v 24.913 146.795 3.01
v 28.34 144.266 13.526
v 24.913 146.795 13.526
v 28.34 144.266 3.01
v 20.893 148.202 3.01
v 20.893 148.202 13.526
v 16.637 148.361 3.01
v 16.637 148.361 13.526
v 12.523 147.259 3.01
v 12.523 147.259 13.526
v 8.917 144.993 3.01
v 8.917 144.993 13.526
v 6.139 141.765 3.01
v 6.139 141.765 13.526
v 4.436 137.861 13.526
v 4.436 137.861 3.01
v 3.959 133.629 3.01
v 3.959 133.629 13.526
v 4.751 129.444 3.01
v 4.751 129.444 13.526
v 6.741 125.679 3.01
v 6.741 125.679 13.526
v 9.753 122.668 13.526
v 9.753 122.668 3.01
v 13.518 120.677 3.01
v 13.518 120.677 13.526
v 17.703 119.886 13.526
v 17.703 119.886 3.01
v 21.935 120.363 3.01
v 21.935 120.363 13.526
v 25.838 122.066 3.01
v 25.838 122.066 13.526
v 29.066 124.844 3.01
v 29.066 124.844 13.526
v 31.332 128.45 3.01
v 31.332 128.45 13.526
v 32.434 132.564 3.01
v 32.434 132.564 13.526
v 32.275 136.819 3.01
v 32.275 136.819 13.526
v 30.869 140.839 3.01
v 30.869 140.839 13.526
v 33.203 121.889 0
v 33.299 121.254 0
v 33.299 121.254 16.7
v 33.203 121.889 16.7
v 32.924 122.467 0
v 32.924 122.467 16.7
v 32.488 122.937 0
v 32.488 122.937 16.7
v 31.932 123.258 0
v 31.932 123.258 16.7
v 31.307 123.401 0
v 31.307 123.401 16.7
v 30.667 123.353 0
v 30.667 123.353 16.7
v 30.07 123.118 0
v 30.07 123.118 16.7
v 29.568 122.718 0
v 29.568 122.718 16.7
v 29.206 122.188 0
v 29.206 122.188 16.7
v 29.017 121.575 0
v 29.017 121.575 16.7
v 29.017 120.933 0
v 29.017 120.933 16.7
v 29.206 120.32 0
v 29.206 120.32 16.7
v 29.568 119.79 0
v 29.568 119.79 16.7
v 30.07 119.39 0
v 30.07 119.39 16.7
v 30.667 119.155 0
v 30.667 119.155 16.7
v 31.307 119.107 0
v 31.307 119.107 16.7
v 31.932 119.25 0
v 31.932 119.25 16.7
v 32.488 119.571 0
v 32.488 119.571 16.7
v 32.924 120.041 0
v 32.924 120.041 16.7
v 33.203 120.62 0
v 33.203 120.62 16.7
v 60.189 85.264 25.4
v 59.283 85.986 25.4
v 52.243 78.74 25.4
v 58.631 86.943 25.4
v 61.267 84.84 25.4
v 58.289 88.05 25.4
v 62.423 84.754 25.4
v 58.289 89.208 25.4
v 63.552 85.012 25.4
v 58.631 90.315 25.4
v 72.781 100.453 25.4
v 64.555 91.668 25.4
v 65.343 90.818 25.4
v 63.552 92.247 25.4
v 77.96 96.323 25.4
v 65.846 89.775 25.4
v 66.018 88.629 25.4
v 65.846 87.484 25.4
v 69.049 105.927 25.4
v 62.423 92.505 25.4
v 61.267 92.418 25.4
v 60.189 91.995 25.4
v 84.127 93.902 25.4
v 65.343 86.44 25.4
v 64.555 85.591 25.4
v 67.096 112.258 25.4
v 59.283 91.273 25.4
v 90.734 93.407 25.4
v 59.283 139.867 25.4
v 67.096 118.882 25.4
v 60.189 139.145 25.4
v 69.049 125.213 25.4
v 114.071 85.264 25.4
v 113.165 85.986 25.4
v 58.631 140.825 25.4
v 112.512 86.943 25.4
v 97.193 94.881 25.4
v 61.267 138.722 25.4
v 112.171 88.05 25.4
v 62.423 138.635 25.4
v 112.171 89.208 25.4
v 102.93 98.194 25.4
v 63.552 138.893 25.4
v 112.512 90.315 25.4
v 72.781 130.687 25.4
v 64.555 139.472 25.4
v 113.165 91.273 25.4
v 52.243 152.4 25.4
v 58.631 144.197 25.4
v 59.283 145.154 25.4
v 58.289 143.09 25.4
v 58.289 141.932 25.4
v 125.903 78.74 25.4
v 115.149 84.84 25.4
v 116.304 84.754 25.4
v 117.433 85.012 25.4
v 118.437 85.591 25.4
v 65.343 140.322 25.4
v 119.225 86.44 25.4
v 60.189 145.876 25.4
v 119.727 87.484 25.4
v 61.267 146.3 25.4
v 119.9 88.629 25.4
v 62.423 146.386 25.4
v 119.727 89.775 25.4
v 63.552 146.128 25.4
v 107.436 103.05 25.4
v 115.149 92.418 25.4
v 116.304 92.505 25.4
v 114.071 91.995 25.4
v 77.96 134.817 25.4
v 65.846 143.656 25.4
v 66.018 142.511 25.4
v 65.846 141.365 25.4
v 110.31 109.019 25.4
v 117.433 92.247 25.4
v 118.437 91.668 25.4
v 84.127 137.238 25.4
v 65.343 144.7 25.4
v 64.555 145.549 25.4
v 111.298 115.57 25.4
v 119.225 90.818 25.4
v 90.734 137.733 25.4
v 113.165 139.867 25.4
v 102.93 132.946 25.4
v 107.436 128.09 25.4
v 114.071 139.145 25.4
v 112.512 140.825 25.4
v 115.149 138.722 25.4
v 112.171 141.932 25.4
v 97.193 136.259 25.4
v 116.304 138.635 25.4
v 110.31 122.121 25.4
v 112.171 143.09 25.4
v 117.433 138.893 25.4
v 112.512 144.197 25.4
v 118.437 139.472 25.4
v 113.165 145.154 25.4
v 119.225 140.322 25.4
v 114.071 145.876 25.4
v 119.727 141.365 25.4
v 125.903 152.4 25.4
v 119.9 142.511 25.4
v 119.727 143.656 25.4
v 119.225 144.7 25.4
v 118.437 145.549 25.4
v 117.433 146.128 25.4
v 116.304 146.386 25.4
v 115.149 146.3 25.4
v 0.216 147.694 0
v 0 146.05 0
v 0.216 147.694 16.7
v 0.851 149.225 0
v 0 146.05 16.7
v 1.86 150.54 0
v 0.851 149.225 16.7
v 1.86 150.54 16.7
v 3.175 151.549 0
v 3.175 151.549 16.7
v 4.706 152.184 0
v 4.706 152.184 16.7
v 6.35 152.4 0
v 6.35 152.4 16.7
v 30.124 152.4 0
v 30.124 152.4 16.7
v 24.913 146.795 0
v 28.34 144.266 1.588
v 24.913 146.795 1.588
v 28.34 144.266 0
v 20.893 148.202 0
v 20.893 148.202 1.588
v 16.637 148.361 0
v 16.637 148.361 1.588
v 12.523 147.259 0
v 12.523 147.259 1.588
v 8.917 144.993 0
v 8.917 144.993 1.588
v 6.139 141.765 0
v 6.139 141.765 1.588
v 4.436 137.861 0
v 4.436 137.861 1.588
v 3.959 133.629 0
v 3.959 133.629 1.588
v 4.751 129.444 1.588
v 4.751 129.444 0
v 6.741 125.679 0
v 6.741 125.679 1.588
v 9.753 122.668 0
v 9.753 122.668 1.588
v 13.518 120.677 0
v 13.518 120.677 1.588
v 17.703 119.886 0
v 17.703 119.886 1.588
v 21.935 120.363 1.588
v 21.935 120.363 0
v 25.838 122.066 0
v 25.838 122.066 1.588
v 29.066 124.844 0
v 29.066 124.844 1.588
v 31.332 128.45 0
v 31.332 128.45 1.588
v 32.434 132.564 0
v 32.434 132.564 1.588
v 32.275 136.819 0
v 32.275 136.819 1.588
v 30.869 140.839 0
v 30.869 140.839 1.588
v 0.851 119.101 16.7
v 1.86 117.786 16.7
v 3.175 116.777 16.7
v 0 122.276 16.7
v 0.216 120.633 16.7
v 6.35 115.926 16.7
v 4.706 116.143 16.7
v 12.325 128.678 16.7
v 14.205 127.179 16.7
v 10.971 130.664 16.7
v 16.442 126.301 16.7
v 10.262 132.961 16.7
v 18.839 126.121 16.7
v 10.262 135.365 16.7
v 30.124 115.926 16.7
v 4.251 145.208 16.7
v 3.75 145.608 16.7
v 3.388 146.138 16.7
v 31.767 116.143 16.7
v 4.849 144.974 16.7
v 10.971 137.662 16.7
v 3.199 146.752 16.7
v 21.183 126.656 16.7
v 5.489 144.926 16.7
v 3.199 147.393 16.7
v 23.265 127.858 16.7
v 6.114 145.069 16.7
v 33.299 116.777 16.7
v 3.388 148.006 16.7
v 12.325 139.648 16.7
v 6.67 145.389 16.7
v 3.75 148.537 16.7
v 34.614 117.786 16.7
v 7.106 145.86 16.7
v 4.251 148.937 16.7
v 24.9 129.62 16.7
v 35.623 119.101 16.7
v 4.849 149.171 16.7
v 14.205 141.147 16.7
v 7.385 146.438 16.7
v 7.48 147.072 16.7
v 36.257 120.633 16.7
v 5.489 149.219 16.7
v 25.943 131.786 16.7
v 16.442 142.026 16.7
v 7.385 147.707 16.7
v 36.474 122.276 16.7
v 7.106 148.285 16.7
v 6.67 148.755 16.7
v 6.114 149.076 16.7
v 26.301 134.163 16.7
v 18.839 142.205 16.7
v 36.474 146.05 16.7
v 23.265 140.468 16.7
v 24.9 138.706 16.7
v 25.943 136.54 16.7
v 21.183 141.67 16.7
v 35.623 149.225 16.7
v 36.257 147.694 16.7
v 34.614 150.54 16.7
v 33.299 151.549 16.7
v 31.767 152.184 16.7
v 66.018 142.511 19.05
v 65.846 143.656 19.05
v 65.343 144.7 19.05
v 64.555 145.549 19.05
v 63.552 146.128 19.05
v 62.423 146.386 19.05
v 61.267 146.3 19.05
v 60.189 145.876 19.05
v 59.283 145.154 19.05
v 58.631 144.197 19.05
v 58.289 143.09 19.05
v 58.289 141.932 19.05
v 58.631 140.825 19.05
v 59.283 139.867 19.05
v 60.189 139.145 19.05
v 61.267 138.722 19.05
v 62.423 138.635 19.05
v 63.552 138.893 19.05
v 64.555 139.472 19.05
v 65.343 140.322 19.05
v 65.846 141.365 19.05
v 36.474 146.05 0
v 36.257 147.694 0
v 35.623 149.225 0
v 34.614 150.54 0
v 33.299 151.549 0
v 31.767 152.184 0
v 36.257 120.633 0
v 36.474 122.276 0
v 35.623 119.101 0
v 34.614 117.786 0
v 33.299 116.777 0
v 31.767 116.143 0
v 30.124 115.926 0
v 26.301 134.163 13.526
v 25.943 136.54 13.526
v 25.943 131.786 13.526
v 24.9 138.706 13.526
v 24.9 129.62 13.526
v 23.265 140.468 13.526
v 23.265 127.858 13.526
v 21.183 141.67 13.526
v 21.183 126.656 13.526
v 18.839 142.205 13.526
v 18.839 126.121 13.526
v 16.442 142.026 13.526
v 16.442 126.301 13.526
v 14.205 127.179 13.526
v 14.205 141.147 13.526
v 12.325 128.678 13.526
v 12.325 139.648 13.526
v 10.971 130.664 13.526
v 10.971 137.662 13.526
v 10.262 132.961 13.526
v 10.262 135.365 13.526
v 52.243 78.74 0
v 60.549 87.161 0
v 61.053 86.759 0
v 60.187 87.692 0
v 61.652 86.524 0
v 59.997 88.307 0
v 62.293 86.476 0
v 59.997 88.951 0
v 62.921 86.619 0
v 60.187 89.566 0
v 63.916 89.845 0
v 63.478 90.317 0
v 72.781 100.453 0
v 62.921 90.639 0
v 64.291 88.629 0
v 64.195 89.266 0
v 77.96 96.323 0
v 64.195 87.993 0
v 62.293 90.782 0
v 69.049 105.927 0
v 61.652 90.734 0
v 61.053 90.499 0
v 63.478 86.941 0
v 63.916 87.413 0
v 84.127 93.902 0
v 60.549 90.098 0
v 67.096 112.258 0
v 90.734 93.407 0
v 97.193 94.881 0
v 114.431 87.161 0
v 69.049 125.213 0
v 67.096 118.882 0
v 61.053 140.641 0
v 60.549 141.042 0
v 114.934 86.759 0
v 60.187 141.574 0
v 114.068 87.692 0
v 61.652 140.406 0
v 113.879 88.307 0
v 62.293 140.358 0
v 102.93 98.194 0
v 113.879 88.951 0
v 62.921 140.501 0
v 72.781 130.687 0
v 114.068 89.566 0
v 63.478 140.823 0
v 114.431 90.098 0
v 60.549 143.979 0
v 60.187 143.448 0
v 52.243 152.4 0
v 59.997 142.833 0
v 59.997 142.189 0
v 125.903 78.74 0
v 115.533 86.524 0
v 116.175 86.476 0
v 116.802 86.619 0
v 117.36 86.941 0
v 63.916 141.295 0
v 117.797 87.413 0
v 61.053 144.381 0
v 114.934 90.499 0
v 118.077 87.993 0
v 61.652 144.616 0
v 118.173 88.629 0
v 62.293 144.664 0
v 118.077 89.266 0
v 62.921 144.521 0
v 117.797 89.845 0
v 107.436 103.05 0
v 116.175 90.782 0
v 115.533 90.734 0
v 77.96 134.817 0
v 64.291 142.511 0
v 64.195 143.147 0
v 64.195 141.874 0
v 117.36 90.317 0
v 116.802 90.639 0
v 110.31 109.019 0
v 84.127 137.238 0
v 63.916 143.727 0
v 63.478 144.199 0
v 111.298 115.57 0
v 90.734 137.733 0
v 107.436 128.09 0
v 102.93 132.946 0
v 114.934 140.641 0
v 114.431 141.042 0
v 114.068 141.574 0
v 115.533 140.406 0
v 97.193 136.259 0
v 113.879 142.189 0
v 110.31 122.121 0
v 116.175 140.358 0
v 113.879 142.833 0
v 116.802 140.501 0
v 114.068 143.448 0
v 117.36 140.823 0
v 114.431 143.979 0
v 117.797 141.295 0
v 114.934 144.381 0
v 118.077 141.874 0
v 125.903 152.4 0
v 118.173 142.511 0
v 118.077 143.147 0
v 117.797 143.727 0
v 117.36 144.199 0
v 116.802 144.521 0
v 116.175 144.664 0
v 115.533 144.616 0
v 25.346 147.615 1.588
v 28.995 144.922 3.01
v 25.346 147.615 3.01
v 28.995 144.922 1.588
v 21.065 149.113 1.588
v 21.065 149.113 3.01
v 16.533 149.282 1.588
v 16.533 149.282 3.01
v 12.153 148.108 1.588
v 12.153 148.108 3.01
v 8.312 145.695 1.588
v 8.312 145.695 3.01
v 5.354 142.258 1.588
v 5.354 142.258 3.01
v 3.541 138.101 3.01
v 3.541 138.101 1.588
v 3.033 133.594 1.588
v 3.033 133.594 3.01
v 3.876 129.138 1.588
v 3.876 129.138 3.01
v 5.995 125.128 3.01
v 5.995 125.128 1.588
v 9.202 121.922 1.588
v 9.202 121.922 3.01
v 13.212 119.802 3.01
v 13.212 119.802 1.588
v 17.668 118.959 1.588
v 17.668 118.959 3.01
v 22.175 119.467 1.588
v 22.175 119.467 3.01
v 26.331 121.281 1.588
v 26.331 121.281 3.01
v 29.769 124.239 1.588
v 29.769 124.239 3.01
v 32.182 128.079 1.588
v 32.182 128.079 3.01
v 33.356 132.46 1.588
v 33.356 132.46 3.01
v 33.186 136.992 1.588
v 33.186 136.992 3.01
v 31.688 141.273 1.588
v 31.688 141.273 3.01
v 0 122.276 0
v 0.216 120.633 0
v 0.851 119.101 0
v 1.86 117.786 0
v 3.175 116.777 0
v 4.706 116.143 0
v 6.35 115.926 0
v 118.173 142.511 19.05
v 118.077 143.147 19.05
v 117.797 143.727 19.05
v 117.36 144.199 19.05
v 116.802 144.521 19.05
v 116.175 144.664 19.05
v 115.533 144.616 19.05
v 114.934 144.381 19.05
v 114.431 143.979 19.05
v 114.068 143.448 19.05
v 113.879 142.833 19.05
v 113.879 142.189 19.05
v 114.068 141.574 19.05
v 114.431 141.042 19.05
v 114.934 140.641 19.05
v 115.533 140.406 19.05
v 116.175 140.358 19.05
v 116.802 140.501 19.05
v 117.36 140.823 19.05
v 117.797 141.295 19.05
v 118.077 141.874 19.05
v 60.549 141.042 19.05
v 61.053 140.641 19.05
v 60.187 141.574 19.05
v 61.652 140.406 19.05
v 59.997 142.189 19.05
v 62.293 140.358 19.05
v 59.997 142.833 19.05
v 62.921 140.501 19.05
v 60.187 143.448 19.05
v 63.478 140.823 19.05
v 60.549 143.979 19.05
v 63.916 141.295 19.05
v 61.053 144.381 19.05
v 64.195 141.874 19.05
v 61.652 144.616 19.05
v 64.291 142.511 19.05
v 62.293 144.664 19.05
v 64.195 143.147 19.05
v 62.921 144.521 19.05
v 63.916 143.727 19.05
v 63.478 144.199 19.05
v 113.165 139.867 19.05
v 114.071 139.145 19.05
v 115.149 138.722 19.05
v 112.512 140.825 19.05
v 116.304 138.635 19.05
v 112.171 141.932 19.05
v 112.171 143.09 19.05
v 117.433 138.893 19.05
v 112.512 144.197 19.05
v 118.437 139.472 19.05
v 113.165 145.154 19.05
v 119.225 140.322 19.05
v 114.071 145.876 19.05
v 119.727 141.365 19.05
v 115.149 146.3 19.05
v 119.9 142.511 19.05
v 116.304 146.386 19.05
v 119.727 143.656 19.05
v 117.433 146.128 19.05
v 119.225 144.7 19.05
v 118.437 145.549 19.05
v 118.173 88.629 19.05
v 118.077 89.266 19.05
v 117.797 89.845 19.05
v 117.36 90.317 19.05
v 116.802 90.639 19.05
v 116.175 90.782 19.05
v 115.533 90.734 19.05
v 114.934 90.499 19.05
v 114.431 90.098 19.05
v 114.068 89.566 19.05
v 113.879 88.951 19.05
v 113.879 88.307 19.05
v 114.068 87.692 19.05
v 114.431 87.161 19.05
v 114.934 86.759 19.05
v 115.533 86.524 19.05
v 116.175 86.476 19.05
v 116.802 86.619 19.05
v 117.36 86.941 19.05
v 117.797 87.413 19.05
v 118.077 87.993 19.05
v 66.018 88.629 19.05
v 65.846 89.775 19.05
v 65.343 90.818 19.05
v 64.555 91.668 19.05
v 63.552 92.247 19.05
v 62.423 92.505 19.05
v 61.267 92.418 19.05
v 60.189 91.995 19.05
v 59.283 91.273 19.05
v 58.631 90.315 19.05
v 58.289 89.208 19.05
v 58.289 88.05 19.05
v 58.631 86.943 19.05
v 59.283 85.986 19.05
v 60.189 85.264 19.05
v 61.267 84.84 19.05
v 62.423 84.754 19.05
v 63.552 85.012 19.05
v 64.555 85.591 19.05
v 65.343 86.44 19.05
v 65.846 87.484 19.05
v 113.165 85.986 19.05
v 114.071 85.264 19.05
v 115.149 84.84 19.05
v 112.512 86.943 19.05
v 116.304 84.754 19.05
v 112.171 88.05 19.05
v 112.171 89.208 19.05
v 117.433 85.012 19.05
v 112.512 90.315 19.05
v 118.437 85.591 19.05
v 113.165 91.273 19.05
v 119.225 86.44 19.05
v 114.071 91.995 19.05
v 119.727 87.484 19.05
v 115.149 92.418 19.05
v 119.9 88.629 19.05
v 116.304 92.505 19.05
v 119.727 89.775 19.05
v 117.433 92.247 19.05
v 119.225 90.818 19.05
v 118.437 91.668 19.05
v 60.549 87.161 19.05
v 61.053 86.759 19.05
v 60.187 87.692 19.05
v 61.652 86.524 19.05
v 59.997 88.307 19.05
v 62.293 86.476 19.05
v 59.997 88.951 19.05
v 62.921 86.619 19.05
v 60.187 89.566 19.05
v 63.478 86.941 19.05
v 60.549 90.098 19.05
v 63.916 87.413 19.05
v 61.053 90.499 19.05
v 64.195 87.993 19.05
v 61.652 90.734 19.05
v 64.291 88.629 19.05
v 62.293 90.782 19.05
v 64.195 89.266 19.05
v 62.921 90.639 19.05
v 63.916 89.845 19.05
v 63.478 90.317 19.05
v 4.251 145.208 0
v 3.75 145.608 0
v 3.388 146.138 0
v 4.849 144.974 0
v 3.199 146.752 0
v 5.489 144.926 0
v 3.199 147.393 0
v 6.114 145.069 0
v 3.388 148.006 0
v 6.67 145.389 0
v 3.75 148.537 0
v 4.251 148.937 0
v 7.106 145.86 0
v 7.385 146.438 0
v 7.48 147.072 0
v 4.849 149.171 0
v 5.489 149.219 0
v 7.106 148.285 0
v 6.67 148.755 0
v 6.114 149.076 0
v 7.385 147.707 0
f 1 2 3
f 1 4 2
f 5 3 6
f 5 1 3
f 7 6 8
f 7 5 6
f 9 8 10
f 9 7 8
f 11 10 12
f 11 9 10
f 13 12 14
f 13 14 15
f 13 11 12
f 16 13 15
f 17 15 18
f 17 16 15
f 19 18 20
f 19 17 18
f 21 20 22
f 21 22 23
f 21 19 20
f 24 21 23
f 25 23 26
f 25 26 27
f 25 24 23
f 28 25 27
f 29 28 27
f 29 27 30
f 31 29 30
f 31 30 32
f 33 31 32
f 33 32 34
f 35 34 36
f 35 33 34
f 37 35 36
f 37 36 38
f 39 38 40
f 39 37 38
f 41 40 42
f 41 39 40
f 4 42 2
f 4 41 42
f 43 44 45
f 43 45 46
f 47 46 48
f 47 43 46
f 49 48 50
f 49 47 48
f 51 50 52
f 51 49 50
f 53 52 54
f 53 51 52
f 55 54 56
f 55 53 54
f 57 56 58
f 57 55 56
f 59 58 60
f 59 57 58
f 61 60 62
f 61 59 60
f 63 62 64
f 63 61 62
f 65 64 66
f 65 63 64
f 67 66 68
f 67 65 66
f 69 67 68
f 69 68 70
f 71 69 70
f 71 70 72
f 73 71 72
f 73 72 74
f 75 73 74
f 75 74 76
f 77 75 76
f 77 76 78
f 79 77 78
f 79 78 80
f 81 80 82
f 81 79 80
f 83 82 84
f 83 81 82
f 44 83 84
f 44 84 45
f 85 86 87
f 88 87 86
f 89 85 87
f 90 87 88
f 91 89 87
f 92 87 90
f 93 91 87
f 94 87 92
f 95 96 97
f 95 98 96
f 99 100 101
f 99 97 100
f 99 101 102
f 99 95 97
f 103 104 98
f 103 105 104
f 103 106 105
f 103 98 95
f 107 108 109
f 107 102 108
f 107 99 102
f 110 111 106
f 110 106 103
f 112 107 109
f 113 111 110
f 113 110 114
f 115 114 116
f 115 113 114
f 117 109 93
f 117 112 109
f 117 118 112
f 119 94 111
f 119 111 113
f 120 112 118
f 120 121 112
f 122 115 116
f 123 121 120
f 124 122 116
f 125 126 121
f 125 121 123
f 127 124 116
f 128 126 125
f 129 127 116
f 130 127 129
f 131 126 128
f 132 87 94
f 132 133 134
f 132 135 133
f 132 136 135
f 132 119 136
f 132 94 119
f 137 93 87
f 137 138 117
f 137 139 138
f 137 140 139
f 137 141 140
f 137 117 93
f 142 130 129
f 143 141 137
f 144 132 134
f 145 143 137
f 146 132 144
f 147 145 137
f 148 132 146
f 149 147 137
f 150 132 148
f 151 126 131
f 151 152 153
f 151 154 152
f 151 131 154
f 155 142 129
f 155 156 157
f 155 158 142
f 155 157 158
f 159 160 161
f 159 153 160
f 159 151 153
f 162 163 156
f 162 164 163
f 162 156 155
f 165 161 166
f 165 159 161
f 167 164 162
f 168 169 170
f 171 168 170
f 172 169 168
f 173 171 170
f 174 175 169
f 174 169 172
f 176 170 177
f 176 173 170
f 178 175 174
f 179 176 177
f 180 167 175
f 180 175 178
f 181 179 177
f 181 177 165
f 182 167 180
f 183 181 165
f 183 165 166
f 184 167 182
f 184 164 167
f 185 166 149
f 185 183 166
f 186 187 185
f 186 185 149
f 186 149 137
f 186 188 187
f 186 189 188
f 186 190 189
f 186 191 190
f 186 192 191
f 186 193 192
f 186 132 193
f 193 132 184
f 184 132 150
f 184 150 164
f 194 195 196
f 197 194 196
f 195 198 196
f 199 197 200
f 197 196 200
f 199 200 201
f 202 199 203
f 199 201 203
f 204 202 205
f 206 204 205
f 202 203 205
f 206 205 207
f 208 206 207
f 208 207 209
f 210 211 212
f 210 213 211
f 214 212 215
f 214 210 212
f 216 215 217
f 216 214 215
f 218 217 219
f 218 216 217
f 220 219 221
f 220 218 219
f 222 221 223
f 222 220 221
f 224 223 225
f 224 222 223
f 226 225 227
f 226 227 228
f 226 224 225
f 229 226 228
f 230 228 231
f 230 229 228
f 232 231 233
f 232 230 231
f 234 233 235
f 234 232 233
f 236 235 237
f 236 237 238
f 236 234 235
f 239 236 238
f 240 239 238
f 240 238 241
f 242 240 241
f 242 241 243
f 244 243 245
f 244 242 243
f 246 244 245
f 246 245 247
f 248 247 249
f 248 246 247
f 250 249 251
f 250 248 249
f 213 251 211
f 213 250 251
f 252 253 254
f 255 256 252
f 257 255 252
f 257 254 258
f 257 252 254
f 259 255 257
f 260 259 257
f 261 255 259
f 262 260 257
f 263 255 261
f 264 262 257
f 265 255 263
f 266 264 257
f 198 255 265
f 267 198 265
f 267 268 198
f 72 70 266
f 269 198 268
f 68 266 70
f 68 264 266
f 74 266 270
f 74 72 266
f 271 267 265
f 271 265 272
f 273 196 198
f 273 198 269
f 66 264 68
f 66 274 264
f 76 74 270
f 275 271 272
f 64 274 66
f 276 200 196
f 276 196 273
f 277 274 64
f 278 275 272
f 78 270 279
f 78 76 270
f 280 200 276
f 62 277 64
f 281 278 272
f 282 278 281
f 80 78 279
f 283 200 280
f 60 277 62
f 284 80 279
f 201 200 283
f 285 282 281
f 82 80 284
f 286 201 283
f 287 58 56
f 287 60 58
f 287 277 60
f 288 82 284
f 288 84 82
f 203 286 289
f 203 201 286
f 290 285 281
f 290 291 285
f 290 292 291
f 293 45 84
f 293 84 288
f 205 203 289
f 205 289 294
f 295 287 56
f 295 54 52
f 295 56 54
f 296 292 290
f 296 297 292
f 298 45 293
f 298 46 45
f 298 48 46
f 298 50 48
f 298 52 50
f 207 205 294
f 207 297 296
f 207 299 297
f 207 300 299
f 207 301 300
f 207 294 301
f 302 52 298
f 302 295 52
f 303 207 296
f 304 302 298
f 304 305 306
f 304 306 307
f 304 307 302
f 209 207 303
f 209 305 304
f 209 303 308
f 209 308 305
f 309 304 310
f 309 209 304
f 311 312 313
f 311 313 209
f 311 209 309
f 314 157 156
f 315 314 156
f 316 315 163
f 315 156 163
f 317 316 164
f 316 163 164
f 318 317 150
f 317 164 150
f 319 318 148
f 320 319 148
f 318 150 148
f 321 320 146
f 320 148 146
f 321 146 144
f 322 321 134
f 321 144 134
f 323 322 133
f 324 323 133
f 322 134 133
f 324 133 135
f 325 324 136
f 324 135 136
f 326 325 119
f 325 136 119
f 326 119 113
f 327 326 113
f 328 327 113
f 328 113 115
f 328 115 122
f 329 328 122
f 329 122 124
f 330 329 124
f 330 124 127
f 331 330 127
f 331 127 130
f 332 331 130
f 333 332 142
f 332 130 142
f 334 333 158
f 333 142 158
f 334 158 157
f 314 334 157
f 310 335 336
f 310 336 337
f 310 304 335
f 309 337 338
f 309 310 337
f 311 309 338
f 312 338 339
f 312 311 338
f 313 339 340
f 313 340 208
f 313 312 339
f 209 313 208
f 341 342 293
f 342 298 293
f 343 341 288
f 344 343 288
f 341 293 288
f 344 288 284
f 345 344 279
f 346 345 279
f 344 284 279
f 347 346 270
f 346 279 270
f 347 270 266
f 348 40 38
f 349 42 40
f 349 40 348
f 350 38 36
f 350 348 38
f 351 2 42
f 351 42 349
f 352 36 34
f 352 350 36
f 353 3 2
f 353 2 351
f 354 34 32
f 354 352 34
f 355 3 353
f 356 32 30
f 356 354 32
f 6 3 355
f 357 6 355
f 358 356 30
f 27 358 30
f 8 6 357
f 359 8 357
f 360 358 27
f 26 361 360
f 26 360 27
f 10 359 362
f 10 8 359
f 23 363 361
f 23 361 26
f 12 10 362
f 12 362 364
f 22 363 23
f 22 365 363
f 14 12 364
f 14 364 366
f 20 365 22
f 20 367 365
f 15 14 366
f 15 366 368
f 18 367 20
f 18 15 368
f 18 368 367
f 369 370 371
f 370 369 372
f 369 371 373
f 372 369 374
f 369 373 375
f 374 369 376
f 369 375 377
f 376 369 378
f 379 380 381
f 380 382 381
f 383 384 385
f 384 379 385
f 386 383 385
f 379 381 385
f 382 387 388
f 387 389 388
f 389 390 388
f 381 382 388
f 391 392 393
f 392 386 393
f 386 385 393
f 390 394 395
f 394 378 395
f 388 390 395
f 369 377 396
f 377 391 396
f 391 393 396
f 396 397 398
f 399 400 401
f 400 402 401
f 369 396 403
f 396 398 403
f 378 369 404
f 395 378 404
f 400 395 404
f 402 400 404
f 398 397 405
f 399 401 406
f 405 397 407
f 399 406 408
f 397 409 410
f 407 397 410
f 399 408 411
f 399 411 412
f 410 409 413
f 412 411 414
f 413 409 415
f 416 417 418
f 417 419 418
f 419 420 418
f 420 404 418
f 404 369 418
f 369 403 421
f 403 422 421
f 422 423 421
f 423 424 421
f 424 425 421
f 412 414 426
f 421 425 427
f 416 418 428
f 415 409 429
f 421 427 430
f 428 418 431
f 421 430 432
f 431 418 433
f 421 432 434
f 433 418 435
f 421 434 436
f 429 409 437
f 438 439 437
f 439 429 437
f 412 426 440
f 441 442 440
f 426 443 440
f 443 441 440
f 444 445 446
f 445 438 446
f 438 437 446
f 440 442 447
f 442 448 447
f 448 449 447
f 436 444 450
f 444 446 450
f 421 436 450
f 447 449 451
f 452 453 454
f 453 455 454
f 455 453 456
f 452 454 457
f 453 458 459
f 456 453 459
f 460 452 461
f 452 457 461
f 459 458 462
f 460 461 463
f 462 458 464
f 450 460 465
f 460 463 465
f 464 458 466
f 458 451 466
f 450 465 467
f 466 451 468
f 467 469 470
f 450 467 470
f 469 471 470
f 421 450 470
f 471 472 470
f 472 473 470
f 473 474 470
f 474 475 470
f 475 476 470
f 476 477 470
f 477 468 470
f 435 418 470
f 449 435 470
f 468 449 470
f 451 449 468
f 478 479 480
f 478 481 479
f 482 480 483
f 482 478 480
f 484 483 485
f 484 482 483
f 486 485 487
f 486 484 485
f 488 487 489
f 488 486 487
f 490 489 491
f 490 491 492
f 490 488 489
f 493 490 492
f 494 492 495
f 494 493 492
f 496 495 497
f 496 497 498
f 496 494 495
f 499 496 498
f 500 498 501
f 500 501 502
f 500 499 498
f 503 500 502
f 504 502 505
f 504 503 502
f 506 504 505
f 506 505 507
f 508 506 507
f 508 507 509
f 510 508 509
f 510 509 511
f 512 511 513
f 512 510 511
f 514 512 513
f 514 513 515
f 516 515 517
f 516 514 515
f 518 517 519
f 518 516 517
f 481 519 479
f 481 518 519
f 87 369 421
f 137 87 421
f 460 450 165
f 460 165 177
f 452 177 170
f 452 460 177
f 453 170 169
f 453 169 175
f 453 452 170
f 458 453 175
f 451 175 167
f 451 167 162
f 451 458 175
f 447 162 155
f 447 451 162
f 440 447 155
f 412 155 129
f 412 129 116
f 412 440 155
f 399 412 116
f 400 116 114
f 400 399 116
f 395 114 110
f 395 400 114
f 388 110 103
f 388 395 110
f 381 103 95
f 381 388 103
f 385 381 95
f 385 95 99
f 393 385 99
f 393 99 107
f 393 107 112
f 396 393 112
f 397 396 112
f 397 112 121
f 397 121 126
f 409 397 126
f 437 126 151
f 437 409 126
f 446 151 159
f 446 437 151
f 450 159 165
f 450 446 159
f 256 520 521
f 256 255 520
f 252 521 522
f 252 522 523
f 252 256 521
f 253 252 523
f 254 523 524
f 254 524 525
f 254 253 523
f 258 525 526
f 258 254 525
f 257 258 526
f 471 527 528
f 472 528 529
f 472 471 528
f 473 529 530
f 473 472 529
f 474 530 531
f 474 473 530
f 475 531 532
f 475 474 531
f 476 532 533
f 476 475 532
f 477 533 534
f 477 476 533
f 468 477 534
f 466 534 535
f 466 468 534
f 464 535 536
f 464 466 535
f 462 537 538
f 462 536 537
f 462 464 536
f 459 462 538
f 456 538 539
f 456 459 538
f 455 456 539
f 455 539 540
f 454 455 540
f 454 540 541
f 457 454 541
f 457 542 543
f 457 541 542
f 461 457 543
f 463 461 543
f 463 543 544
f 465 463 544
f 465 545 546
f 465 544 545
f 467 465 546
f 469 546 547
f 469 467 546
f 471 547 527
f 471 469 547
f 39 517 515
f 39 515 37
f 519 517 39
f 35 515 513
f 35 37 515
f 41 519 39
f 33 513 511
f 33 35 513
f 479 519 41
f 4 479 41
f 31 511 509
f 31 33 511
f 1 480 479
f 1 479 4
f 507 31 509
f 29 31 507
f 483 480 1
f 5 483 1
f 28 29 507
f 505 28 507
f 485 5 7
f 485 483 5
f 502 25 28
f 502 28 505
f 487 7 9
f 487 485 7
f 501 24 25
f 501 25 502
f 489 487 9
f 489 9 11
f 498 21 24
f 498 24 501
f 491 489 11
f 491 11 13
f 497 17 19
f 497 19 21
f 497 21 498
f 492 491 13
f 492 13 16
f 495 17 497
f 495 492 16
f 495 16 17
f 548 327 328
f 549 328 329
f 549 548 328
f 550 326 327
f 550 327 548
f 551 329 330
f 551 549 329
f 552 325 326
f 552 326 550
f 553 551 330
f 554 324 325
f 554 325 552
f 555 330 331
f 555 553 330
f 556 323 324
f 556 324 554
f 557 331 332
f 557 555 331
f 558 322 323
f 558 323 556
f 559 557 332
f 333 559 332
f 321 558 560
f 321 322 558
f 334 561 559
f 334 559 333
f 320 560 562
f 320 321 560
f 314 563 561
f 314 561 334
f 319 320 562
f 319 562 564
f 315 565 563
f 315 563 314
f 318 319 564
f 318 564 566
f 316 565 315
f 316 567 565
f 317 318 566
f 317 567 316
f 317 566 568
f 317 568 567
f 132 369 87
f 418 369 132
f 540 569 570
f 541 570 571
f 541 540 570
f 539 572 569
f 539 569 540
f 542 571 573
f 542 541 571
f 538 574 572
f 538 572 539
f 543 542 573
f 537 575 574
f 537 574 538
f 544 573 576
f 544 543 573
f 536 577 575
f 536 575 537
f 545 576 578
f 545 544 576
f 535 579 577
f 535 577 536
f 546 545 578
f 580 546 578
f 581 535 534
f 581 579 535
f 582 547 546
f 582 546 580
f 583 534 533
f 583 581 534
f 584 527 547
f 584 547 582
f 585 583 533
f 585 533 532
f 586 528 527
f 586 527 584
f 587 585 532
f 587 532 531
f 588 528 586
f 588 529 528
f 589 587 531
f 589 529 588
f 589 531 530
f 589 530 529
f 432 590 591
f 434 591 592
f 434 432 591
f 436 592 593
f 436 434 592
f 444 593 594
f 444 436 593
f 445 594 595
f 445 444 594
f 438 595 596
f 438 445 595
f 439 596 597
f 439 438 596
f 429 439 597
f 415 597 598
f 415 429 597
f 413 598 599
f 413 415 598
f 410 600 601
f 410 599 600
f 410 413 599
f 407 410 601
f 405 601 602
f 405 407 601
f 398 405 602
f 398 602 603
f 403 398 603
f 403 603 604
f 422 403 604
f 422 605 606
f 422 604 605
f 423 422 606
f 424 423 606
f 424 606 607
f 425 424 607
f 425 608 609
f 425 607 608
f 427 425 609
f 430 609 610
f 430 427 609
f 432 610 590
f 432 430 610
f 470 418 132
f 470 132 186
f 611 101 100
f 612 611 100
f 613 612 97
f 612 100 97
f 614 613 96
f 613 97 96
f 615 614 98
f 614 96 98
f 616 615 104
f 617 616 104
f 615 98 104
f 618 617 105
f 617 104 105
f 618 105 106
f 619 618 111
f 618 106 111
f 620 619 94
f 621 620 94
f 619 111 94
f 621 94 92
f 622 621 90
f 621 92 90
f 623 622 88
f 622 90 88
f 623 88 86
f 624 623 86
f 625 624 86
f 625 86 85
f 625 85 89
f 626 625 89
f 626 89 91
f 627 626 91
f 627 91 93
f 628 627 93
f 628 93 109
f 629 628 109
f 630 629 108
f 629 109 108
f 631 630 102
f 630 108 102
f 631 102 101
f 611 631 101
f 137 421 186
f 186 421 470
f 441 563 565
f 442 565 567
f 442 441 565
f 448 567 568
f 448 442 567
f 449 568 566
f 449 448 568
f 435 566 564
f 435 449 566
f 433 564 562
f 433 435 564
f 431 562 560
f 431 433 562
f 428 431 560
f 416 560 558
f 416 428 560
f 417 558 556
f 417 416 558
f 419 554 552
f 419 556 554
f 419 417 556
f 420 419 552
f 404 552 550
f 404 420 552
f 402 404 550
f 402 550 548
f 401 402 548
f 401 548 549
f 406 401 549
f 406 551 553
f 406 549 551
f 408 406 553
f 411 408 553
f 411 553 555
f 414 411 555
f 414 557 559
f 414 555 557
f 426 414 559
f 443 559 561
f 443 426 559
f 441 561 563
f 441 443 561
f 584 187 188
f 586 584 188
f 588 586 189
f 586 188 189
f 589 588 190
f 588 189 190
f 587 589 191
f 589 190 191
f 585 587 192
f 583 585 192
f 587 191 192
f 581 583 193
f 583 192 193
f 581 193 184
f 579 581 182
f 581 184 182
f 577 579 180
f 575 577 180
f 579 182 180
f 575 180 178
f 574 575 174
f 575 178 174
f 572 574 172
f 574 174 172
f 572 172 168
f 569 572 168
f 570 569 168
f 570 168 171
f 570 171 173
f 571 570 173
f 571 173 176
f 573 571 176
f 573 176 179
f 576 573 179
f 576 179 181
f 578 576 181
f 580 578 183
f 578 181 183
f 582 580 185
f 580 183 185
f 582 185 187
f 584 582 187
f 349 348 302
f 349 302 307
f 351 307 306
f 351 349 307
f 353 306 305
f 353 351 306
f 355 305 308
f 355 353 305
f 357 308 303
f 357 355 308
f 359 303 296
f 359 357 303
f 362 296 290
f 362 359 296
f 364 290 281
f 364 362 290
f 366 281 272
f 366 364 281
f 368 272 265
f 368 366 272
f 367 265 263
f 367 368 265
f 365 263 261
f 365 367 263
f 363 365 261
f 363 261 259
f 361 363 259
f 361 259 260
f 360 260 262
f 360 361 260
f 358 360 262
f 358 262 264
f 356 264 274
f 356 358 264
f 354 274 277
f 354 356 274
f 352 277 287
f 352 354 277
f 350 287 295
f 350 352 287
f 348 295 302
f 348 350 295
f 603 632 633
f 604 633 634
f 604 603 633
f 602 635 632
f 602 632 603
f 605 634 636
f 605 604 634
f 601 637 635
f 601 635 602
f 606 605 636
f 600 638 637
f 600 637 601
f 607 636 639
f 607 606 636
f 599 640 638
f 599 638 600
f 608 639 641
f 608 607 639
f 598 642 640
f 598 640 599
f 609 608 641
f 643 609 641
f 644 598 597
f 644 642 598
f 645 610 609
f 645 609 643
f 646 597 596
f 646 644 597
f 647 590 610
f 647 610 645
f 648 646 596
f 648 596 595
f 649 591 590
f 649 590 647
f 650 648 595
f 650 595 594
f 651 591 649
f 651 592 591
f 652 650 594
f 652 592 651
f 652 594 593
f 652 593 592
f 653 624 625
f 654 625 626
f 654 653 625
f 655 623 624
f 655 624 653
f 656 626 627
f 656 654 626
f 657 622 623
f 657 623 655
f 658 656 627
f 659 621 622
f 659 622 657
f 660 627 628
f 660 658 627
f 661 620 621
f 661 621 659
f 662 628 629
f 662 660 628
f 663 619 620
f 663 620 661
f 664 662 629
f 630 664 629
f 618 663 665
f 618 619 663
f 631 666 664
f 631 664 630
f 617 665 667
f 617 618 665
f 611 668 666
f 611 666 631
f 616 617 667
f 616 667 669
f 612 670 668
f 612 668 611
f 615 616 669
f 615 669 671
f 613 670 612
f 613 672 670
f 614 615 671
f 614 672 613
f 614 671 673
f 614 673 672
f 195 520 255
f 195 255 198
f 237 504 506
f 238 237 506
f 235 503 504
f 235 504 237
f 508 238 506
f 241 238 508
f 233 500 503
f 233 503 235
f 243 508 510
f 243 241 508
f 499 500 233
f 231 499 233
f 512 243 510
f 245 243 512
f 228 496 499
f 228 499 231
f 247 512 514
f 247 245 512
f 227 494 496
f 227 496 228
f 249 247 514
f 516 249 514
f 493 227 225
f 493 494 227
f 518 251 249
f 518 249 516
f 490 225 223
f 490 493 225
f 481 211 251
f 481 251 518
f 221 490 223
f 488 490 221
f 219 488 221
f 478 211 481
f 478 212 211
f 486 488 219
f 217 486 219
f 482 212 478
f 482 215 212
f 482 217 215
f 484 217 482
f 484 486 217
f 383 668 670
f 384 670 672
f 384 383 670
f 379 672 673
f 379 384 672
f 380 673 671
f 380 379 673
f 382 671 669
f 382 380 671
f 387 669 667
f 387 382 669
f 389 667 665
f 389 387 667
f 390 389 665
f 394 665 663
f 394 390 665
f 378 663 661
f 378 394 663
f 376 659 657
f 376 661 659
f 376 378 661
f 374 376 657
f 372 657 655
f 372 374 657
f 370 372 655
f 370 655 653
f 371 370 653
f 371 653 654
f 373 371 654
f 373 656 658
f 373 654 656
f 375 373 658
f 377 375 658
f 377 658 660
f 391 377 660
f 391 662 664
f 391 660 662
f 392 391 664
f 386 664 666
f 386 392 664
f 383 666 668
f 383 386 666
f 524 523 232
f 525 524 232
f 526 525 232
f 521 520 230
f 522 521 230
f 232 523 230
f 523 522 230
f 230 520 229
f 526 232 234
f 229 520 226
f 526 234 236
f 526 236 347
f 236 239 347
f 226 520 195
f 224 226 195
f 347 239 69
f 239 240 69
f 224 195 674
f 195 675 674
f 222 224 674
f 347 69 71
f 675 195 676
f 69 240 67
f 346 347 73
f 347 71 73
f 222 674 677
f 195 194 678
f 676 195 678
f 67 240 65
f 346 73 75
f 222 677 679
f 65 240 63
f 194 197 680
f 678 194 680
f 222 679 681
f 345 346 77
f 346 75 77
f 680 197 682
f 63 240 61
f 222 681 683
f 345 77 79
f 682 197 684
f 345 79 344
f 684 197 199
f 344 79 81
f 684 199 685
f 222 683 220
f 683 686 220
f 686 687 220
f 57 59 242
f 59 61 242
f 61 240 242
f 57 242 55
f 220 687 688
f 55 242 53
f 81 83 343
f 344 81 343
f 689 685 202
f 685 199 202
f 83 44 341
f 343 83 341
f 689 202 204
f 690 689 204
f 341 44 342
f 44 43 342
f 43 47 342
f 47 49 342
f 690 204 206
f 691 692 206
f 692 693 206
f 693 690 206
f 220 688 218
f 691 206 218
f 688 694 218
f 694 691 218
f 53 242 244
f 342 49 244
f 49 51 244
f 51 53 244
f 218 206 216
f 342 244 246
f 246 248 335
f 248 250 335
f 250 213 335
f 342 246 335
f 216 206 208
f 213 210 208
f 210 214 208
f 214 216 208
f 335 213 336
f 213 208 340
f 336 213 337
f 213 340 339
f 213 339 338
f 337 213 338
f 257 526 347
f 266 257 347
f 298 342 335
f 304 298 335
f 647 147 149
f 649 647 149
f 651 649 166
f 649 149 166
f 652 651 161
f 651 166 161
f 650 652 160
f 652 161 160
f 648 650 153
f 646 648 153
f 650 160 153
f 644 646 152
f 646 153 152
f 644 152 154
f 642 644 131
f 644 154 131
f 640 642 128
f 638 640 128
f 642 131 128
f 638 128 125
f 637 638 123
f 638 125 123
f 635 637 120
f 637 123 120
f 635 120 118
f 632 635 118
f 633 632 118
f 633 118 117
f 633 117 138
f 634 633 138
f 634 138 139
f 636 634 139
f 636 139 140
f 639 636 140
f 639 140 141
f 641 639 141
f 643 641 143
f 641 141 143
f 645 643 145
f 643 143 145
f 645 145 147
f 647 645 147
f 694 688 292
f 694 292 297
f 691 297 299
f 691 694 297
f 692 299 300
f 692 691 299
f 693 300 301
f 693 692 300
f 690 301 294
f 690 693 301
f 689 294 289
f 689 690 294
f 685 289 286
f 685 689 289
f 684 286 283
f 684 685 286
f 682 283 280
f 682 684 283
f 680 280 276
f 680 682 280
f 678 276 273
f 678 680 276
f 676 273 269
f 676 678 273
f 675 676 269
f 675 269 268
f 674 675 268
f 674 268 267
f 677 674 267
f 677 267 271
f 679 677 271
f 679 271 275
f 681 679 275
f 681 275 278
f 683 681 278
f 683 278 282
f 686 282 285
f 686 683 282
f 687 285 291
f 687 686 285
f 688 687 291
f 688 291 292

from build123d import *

# Parameters (mm, degrees)
F0_W     = 73.66
F0_H     = 73.66
F0_R     = 2.159
F0_R_2   = 22.225
F1_DEPTH = 25.4
F0_W_2   = 36.4735363481
F0_H_2   = 36.4735363481
F0_R_3   = 2.15265
F0_R_4   = 14.2875
F0_R_5   = 8.0645
F2_DEPTH = 16.7005
F3_R     = 3.8862
F4_DEPTH = 6.35
F8_R     = 6.35


with BuildPart() as f1:
    # F0 (on Top) → F1 (new body)
    with BuildSketch(Plane.XY):
        with Locations((89.0728744893, 115.57)):
            Rectangle(F0_W, F0_H)
        with Locations((62.1321061261, 88.6292316368)):
            Circle(F0_R, mode=Mode.SUBTRACT)
        with Locations((116.0136428525, 88.6292316368)):
            Circle(F0_R, mode=Mode.SUBTRACT)
        with Locations((89.0728744893, 115.57)):
            Circle(F0_R_2, mode=Mode.SUBTRACT)
        with Locations((62.1321061261, 142.5107683632)):
            Circle(F0_R, mode=Mode.SUBTRACT)
        with Locations((116.0136428525, 142.5107683632)):
            Circle(F0_R, mode=Mode.SUBTRACT)
    extrude(amount=F1_DEPTH)

    # F3 (on face) → F4 (cut)
    with BuildSketch(Plane.XY.offset(25.4)):
        with Locations((62.1321061261, 142.5107683632)):
            Circle(F3_R)
        with Locations((62.1321061261, 88.6292316368)):
            Circle(F3_R)
        with Locations((116.0136428525, 88.6292316368)):
            Circle(F3_R)
        with Locations((116.0136428525, 142.5107683632)):
            Circle(F3_R)
    extrude(amount=-F4_DEPTH, mode=Mode.SUBTRACT)


with BuildPart() as f2:
    # F0 (on Top) → F2 (new body)
    with BuildSketch(Plane.XY):
        with Locations((18.236768174, 134.163231826)):
            Rectangle(F0_W_2, F0_H_2)
        with Locations((31.1458863481, 121.2541136519)):
            Circle(F0_R_3, mode=Mode.SUBTRACT)
        with Locations((18.236768174, 134.163231826)):
            Circle(F0_R_4, mode=Mode.SUBTRACT)
        with Locations((5.32765, 147.07235)):
            Circle(F0_R_3, mode=Mode.SUBTRACT)
        with Locations((18.236768174, 134.163231826)):
            Circle(F0_R_4)
        with Locations((18.236768174, 134.163231826)):
            Circle(F0_R_5, mode=Mode.SUBTRACT)
    extrude(amount=F2_DEPTH)

    # F6 (on line) → F7 (revolve, cut)
    with BuildSketch(Plane(origin=(-57.963231826, 57.963231826, 0), x_dir=(-0.7071067812, -0.7071067812, 0), z_dir=(-0.7071067812, 0.7071067812, 0))):
        Polygon((-122.0505734528, 0), (-107.7630734528, 0), (-107.7630734528, 16.7005), (-115.8275734528, 16.7005), (-115.8275734528, 13.5255), (-122.0505734528, 13.5255), (-122.0505734528, 3.0099), (-122.9776734528, 3.0099), (-122.9776734528, 1.5875), (-122.0505734528, 1.5875), align=None)
    revolve(axis=Axis((18.236768174, 134.163231826, 8.35025), (0, 0, 1)), mode=Mode.SUBTRACT)

    # F8
    f8_edges = [f2.edges().sort_by_distance(p)[0] for p in [
        (0, 152.4, 8.35025),
        (36.473536, 152.4, 8.35025),
        (36.473536, 115.926464, 8.35025),
        (0, 115.926464, 8.35025),
    ]]
    fillet(f8_edges, radius=F8_R)


solid = Compound([f1.part, f2.part])
